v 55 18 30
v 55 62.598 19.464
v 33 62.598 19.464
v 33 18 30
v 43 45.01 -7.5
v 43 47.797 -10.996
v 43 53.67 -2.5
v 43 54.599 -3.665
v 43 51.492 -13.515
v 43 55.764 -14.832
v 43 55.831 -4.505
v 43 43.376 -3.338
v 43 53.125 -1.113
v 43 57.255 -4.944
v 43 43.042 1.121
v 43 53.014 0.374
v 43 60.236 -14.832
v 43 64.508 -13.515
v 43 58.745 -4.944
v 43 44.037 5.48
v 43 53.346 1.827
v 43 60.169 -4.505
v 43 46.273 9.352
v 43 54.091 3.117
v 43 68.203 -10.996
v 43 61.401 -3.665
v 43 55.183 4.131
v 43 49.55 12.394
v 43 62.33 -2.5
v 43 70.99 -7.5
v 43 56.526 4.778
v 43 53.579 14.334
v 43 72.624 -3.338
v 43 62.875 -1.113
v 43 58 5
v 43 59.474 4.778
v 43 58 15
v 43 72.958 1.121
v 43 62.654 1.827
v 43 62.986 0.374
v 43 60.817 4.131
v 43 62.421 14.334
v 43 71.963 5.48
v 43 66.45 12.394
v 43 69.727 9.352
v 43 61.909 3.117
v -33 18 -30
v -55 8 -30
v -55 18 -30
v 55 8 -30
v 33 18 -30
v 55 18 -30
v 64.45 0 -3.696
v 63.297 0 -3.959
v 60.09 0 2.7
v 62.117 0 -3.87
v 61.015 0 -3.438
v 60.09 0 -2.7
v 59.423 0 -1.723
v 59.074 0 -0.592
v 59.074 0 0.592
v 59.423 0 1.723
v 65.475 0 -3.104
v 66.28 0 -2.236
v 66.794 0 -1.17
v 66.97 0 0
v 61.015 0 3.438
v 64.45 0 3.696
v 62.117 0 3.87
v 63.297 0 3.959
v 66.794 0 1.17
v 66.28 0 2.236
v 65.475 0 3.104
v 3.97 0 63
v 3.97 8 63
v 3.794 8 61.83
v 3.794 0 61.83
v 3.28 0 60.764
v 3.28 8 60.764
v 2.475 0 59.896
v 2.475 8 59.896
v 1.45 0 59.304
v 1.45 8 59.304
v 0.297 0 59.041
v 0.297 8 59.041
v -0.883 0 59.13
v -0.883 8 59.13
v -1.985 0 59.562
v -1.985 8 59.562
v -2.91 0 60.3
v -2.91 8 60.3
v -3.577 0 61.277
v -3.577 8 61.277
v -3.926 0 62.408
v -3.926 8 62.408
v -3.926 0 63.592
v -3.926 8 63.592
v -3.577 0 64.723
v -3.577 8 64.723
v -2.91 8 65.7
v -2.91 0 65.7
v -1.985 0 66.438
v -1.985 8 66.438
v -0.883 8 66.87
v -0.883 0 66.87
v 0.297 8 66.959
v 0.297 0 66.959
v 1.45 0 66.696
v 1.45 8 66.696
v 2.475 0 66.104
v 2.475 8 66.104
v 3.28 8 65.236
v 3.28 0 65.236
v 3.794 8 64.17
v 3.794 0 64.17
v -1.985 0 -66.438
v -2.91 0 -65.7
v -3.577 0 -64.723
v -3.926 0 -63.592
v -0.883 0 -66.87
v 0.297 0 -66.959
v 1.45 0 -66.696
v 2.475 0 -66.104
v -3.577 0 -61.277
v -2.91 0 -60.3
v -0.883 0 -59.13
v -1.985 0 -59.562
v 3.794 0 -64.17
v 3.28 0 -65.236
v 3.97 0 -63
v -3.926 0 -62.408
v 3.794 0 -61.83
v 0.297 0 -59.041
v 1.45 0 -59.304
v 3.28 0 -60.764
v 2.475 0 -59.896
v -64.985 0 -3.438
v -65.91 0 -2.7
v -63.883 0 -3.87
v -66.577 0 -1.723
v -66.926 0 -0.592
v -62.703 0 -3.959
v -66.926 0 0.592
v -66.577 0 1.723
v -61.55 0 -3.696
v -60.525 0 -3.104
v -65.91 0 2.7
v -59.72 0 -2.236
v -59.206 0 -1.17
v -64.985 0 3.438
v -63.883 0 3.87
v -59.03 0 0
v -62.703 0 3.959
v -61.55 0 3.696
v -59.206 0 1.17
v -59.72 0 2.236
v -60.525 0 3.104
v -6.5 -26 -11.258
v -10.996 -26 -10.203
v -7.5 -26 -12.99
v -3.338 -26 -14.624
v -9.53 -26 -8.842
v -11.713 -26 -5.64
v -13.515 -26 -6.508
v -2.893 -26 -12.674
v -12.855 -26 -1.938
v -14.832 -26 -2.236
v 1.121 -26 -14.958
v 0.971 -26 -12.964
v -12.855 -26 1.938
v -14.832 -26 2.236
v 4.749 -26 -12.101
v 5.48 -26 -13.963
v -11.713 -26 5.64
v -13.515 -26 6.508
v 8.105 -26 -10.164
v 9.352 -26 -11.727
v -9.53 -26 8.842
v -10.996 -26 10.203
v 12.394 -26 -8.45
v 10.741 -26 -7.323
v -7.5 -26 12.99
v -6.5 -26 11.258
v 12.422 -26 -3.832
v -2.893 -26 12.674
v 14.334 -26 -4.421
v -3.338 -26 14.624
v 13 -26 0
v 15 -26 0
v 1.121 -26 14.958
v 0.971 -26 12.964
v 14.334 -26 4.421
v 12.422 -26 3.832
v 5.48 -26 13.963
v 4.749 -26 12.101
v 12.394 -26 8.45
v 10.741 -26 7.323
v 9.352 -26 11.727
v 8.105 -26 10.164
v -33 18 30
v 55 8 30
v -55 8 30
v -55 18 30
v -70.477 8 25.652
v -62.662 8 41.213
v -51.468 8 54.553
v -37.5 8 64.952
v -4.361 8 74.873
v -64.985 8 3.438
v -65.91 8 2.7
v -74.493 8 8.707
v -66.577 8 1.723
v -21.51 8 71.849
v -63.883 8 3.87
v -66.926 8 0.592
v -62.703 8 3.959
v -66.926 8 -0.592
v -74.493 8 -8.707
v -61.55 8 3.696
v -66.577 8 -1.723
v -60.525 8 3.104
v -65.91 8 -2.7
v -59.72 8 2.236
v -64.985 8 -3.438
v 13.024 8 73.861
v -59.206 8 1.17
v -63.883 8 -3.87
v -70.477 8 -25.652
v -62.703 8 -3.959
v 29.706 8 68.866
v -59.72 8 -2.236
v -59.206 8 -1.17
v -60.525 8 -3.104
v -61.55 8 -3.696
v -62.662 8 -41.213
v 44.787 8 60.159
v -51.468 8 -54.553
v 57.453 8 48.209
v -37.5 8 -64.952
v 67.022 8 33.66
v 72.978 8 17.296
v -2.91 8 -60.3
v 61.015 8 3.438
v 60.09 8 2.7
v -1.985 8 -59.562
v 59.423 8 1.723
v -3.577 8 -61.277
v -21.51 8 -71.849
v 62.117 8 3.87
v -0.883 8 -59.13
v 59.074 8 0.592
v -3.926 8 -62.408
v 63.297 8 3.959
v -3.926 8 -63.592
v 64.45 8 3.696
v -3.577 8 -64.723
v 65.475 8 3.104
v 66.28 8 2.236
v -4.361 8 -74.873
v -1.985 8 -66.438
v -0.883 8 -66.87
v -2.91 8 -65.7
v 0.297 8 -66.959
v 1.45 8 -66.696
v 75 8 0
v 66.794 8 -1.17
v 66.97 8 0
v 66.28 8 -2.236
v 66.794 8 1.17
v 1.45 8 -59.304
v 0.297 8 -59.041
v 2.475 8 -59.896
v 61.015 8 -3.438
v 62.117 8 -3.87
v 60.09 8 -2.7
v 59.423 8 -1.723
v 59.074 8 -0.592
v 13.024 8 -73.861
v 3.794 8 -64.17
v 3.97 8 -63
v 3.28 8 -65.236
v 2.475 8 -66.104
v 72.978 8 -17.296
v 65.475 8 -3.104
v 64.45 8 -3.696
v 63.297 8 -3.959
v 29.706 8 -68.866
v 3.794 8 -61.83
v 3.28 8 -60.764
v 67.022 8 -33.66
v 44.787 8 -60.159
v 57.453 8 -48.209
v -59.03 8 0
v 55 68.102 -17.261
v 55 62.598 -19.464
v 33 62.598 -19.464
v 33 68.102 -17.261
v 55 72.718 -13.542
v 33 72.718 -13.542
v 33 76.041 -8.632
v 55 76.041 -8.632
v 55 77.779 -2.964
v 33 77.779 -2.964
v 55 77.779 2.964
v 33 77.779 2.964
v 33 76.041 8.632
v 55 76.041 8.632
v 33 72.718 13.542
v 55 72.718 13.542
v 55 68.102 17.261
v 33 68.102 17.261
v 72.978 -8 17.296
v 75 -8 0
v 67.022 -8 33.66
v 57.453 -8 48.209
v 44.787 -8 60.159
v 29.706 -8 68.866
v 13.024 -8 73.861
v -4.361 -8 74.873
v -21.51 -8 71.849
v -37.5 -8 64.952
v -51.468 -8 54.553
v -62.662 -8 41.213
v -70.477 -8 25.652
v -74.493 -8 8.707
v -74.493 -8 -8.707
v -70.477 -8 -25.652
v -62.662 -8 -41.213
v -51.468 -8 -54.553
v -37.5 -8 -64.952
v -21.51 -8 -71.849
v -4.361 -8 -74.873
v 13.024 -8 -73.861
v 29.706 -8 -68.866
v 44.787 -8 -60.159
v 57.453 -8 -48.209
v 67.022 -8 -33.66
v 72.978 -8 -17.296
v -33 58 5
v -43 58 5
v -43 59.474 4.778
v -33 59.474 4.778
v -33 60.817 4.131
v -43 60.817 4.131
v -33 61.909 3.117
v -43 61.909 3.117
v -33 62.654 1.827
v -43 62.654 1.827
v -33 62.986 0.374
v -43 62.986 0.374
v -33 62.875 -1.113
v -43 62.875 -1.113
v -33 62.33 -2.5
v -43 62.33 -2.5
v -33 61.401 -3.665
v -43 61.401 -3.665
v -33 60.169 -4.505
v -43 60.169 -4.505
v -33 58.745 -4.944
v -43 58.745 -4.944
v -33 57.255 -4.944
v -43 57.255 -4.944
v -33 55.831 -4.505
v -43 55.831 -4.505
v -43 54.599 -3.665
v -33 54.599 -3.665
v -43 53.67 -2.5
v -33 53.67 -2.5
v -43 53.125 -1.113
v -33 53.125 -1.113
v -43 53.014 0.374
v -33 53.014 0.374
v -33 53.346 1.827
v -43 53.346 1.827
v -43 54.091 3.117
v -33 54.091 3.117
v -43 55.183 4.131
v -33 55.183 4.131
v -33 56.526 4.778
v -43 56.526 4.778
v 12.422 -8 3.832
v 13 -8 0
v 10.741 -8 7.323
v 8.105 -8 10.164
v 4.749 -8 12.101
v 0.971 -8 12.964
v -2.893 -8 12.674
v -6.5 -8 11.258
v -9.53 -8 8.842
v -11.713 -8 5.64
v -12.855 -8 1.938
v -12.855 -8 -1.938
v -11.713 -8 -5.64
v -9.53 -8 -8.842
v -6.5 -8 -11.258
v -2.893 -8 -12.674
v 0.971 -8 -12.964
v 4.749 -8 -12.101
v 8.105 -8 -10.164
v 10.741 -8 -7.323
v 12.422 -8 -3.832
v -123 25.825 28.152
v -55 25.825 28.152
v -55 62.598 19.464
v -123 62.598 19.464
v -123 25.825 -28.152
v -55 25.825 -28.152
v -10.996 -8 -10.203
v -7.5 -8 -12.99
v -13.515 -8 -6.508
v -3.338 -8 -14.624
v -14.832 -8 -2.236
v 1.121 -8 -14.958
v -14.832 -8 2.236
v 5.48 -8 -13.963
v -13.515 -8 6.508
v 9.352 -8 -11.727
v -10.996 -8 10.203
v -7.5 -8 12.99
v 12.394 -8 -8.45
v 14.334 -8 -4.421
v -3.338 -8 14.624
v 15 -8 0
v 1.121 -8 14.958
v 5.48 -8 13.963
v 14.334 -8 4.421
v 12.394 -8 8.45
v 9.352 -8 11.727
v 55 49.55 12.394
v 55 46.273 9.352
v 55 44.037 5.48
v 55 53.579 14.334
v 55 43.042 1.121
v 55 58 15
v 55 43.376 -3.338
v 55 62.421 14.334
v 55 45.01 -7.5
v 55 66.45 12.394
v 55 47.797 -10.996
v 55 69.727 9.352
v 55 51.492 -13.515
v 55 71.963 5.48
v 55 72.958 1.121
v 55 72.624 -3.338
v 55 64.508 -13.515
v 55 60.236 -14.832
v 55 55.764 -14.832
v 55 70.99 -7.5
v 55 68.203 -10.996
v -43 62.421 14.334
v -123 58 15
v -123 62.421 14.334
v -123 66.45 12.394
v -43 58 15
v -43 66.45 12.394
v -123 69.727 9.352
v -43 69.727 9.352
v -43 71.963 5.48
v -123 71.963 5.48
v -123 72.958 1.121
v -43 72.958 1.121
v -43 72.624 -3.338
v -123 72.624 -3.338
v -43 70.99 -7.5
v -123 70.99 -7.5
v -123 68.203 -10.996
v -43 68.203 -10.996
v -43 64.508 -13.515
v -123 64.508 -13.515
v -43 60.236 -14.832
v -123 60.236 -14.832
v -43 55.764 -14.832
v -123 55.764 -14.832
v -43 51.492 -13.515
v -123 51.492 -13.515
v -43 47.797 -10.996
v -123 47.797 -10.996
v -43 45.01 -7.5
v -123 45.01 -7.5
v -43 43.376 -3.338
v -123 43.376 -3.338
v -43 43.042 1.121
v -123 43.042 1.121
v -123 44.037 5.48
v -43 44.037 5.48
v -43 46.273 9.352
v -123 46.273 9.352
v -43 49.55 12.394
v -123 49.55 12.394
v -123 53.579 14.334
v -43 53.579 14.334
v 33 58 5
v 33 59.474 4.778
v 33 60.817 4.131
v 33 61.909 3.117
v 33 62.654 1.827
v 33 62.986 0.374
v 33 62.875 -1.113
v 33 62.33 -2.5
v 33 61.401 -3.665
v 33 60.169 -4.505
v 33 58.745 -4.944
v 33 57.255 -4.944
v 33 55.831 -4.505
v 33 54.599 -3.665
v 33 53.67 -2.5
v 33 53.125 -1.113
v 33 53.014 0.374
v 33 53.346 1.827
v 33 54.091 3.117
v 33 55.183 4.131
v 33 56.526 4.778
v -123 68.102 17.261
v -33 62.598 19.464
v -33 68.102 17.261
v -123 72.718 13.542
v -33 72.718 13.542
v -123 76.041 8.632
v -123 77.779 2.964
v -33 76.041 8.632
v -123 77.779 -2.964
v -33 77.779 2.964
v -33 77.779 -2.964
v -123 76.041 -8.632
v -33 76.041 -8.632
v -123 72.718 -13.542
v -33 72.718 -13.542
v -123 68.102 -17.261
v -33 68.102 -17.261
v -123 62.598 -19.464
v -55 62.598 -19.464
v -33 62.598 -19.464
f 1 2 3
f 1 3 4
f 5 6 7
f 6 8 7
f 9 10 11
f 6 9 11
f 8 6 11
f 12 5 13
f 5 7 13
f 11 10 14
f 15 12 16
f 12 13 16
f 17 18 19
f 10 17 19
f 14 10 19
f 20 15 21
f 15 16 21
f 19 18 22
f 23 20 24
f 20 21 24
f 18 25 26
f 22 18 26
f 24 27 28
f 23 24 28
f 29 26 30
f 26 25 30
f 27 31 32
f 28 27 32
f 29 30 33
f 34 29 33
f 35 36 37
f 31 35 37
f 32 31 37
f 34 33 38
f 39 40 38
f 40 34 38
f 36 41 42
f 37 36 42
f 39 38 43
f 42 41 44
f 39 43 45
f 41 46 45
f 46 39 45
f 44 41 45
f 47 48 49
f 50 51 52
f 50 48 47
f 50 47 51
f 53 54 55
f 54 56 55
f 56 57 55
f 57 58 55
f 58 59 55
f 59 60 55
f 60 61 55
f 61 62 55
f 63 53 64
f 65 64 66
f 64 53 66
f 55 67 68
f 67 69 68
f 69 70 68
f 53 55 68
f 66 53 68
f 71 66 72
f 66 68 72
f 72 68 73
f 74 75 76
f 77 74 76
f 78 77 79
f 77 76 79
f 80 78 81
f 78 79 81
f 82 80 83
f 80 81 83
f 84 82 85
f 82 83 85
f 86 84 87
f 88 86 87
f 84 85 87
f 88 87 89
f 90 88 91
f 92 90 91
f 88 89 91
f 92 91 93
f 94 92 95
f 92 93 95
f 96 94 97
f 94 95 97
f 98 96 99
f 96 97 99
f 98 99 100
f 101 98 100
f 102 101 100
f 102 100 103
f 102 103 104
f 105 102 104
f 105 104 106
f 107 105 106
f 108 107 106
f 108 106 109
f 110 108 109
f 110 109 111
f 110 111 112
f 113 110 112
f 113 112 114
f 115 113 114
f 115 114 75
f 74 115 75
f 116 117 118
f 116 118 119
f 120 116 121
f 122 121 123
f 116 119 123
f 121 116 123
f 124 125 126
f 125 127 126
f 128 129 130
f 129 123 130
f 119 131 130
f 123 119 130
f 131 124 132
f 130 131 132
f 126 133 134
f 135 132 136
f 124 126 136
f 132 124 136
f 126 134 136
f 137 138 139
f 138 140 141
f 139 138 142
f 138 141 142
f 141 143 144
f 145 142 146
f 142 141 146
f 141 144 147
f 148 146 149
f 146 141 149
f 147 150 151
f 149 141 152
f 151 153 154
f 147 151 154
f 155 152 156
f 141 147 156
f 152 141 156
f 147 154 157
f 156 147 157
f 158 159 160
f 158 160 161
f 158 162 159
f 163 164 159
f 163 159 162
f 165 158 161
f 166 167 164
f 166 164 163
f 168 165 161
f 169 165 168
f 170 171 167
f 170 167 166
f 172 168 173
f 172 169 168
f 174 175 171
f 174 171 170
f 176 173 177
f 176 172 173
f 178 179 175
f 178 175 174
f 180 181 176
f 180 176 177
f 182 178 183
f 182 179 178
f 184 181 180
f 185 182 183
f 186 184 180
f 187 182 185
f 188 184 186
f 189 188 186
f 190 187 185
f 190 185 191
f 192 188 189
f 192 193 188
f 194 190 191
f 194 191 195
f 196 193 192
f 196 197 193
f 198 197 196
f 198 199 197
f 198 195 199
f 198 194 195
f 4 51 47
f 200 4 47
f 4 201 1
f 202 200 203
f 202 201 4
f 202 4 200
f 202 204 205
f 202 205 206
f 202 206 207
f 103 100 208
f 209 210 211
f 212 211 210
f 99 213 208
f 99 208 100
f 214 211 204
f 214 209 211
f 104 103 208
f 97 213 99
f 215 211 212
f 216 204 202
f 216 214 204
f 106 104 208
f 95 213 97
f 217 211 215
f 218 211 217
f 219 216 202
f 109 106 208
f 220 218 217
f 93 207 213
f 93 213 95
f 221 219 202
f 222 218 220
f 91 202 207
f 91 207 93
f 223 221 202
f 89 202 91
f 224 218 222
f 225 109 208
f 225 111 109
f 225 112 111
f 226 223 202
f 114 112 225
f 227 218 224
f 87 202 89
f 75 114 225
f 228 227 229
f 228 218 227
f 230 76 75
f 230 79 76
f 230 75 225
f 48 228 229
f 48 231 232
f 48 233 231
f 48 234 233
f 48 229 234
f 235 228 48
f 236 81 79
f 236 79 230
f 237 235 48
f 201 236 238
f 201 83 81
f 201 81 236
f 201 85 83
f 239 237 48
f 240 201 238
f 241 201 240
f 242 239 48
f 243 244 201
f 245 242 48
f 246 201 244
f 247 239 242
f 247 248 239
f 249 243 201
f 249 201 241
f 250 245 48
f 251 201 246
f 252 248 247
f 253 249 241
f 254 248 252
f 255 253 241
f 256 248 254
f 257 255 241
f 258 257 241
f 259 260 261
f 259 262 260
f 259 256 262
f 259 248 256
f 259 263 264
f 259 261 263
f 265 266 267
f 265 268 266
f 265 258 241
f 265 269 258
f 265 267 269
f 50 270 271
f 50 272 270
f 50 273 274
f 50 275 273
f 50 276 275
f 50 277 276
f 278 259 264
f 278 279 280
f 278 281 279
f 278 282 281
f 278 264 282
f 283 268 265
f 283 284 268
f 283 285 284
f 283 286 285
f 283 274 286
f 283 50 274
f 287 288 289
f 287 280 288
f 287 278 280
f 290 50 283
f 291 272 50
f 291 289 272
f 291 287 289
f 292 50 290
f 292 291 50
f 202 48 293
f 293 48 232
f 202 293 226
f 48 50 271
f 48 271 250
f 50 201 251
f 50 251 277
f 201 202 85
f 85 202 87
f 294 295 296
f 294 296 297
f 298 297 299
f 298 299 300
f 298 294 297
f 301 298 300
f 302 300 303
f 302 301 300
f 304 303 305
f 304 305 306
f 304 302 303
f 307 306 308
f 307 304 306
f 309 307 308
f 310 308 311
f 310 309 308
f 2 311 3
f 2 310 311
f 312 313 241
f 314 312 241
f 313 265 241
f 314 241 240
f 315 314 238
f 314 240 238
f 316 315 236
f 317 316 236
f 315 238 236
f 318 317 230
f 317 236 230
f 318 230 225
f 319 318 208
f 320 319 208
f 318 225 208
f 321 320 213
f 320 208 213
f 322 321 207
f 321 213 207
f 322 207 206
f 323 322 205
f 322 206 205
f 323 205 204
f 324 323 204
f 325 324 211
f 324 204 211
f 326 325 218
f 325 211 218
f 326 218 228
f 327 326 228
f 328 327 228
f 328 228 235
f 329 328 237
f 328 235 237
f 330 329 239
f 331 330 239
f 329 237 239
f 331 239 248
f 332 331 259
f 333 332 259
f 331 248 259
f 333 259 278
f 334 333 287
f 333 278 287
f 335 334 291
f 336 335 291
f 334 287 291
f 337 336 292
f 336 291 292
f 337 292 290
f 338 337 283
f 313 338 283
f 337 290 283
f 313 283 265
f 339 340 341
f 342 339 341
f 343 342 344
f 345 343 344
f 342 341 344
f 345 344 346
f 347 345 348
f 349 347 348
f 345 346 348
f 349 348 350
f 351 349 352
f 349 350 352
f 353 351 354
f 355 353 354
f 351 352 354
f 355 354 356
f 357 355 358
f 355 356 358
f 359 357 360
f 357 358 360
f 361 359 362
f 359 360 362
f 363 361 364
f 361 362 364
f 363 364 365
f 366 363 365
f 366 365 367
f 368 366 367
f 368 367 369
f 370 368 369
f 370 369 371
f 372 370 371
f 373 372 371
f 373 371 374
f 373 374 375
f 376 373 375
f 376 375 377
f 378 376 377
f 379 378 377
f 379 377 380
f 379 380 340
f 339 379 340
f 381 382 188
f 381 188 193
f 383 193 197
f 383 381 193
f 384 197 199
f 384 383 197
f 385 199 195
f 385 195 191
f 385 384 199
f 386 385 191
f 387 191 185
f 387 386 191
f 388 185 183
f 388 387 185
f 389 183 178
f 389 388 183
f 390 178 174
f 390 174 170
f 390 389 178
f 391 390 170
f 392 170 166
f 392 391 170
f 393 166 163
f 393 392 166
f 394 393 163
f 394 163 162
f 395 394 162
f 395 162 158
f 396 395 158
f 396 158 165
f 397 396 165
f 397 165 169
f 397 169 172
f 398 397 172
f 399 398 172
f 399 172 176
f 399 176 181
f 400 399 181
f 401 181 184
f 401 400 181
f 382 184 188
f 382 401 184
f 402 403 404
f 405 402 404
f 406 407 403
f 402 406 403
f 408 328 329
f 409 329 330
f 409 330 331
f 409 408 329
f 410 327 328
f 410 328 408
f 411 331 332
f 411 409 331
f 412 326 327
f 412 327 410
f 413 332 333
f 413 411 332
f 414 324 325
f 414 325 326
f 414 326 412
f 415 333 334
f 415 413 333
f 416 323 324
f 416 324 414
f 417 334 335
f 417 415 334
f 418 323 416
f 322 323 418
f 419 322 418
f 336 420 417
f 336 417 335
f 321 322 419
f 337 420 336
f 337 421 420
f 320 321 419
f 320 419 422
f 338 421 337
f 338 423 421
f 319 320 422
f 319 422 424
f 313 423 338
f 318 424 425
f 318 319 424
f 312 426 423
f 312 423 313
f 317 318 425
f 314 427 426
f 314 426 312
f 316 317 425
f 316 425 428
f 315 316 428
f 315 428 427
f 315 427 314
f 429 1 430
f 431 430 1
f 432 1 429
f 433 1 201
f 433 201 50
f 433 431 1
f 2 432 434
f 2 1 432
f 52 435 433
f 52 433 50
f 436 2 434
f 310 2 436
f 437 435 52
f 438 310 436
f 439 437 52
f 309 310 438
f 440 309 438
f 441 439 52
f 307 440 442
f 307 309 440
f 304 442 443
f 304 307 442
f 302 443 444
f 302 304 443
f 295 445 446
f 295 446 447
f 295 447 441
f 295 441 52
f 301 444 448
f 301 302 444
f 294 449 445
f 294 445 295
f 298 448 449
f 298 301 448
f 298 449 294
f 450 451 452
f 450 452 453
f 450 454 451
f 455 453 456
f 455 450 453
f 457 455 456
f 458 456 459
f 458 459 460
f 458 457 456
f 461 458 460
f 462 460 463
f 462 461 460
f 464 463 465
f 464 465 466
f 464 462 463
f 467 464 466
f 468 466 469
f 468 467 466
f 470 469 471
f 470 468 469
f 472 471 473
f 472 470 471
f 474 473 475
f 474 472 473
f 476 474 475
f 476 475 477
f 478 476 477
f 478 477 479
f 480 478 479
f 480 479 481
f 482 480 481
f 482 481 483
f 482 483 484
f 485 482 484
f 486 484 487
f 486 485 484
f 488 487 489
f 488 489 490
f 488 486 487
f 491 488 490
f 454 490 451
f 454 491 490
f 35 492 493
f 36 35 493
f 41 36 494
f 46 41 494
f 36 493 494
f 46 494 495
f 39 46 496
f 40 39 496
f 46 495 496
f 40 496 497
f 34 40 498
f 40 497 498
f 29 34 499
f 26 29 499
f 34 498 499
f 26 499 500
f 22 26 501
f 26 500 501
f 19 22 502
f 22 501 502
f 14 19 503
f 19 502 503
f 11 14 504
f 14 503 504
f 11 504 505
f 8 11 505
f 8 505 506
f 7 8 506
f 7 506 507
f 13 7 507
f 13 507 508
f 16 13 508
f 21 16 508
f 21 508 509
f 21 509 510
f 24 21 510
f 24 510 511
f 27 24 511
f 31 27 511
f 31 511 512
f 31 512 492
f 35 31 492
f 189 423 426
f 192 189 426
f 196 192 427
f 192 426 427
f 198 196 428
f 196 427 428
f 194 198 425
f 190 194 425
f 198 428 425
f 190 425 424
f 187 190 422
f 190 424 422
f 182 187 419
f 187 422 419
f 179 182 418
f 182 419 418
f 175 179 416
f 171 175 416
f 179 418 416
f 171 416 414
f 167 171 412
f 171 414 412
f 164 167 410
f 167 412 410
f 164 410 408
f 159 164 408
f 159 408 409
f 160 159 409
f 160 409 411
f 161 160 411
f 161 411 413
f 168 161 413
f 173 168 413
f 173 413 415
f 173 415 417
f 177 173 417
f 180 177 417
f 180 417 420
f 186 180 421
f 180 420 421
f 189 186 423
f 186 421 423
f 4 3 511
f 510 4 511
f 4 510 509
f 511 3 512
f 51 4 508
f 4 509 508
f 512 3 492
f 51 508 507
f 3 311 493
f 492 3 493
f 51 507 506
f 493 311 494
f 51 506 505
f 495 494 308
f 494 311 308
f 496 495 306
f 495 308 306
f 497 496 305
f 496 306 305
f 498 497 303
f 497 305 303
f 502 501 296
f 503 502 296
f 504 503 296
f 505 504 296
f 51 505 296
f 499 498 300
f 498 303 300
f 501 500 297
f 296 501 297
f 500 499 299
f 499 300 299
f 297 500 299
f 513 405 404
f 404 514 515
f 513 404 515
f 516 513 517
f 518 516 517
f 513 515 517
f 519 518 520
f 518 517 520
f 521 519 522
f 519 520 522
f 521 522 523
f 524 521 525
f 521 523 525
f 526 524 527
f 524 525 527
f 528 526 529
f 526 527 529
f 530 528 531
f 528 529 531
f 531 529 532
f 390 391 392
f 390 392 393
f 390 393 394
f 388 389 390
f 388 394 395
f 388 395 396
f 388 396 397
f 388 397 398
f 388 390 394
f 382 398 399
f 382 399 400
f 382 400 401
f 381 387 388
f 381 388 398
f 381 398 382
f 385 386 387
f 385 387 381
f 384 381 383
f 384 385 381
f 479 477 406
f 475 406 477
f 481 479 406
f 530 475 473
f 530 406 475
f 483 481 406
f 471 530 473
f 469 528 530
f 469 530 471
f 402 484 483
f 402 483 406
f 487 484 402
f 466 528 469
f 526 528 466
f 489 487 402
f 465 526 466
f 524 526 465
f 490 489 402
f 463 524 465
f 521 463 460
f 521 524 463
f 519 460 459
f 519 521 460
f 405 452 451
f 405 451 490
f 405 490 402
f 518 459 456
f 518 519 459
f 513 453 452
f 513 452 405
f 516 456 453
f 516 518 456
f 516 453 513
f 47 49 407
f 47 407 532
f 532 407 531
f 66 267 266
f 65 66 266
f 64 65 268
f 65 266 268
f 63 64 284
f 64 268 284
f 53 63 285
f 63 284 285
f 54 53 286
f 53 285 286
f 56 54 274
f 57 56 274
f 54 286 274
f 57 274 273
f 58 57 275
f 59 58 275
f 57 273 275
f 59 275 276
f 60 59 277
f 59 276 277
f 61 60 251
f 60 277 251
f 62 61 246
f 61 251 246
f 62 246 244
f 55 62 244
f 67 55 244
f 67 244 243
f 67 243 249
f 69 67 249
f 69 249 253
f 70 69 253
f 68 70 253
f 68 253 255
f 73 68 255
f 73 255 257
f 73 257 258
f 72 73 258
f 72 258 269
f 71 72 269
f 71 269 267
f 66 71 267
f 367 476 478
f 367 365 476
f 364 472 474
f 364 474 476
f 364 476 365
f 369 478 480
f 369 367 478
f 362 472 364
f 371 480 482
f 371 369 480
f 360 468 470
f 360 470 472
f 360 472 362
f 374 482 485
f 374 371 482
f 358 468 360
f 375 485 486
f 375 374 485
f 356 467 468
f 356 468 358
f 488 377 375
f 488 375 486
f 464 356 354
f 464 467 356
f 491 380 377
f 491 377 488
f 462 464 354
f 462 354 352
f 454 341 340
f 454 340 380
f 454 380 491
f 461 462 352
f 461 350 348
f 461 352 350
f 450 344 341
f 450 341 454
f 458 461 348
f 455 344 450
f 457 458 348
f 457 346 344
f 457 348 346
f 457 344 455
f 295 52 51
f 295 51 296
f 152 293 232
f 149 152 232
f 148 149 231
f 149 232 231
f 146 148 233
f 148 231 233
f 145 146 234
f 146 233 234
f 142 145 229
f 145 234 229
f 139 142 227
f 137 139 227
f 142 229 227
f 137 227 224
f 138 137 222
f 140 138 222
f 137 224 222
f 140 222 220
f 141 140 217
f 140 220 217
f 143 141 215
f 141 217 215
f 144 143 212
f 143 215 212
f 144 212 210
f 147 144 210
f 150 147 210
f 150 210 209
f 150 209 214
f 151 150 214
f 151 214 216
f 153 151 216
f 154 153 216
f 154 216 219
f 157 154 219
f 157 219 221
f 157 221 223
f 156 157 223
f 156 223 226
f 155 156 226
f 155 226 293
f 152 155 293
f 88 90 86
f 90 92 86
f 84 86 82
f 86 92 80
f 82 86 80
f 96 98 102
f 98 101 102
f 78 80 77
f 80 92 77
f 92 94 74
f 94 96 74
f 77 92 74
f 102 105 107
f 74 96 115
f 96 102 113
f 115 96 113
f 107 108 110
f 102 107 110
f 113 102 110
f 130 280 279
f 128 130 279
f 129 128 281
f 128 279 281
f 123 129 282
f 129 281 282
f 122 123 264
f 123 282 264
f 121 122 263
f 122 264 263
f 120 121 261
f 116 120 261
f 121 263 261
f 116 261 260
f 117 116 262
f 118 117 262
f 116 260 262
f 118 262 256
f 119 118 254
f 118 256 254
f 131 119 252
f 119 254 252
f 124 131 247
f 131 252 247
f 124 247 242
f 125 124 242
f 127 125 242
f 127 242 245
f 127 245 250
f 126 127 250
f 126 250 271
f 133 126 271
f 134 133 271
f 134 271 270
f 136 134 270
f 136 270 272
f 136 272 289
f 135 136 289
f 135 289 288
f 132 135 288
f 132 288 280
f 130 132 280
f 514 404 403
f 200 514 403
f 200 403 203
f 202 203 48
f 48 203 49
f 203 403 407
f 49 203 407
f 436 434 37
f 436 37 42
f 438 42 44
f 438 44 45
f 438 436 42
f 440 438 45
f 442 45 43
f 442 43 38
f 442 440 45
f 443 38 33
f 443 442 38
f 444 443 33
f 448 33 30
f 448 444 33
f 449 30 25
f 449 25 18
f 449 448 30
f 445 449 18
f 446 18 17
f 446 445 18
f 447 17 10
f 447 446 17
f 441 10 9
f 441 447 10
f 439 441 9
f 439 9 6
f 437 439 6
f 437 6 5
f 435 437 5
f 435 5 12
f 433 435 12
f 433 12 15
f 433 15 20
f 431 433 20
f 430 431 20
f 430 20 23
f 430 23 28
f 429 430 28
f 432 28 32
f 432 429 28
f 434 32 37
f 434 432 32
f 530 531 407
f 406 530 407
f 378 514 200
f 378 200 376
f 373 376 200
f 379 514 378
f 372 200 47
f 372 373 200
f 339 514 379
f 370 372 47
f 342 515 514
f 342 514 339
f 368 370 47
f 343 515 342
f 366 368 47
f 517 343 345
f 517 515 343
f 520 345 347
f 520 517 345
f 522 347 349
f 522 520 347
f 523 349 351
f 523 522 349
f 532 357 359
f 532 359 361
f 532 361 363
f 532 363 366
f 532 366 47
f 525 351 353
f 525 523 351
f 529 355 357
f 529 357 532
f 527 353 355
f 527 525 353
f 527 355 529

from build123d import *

# Parameters (mm, degrees)
CROQUIS1_R              = 75
SALIENTE_EXTRUIR1_DEPTH = 8
CROQUIS2_R              = 3.97
CORTAR_EXTRUIR1_DEPTH   = 20
SALIENTE_EXTRUIR2_DEPTH = 10
SALIENTE_EXTRUIR3_DEPTH = 22
CROQUIS5_R              = 15
CORTAR_EXTRUIR2_DEPTH   = 12
CROQUIS6_R              = 5
CORTAR_EXTRUIR3_DEPTH   = 126
CROQUIS7_R              = 15
SALIENTE_EXTRUIR4_DEPTH = 68
CROQUIS8_R              = 75
SALIENTE_EXTRUIR5_DEPTH = 8
CROQUIS9_R              = 15
CROQUIS9_R_2            = 13
SALIENTE_EXTRUIR6_DEPTH = 18


with BuildPart() as part:
    # Croquis1 → Saliente-Extruir1 (new body)
    with BuildSketch(Plane(origin=(0, 0, 0), x_dir=(1, 0, 0), z_dir=(0, 1, 0))):
        Circle(CROQUIS1_R)
    extrude(amount=SALIENTE_EXTRUIR1_DEPTH)

    # Croquis2 → Cortar-Extruir1 (cut)
    with BuildSketch(Plane(origin=(0, 8, 0), x_dir=(1, 0, 0), z_dir=(0, 1, 0))):
        with Locations((0, 63)):
            Circle(CROQUIS2_R)
        with Locations((63, 0)):
            Circle(CROQUIS2_R)
        with Locations((0, -63)):
            Circle(CROQUIS2_R)
        with Locations((-63, 0)):
            Circle(CROQUIS2_R)
    extrude(amount=-CORTAR_EXTRUIR1_DEPTH, mode=Mode.SUBTRACT)

    # Croquis3 → Saliente-Extruir2 (add)
    with BuildSketch(Plane(origin=(0, 8, 0), x_dir=(1, 0, 0), z_dir=(0, 1, 0))):
        Polygon((-55, 0), (-55, 30), (55, 30), (55, 0), (55, -30), (-55, -30), align=None)
    extrude(amount=SALIENTE_EXTRUIR2_DEPTH)

    # Croquis4 → Saliente-Extruir3 (add)
    with BuildSketch(Plane(origin=(55, 0, 0), x_dir=(0, 0, -1), z_dir=(1, 0, 0))):
        with BuildLine():
            Line((-30, 18), (30, 18))
            Line((30, 18), (19.464281728, 62.598174498))
            ThreePointArc((19.464281728, 62.598174498), (0, 78.000036798), (-19.464281728, 62.598174498))
            Line((-19.464281728, 62.598174498), (-30, 18))
        make_face()
    saliente_extruir3 = extrude(amount=-SALIENTE_EXTRUIR3_DEPTH)

    # Simetría1: Saliente-Extruir3 across plane
    add(saliente_extruir3.mirror(Plane(origin=(0, 0, 0), x_dir=(0, 0, 1), z_dir=(1, 0, 0))))

    # Croquis5 → Cortar-Extruir2 (cut)
    with BuildSketch(Plane.ZY.offset(55)):
        with Locations((0, 58)):
            Circle(CROQUIS5_R)
    cortar_extruir2 = extrude(amount=-CORTAR_EXTRUIR2_DEPTH, mode=Mode.SUBTRACT)

    # Simetría2: Cortar-Extruir2 across plane
    add(cortar_extruir2.mirror(Plane(origin=(0, 0, 0), x_dir=(0, 0, 1), z_dir=(1, 0, 0))), mode=Mode.SUBTRACT)

    # Croquis6 → Cortar-Extruir3 (cut)
    with BuildSketch(Plane.ZY.offset(43)):
        with Locations((0, 58)):
            Circle(CROQUIS6_R)
    extrude(amount=-CORTAR_EXTRUIR3_DEPTH, mode=Mode.SUBTRACT)

    # Croquis7 → Saliente-Extruir4 (add)
    with BuildSketch(Plane.ZY.offset(55)):
        with BuildLine():
            Line((-19.464281728, 62.598174498), (-28.151527476, 25.824668242))
            Line((-28.151527476, 25.824668242), (28.151527476, 25.824668242))
            Line((28.151527476, 25.824668242), (19.464281728, 62.598174498))
            ThreePointArc((19.464281728, 62.598174498), (0, 78.000036798), (-19.464281728, 62.598174498))
        make_face()
        with Locations((0, 58)):
            Circle(CROQUIS7_R, mode=Mode.SUBTRACT)
    extrude(amount=SALIENTE_EXTRUIR4_DEPTH)

    # Croquis8 → Saliente-Extruir5 (add)
    with BuildSketch(Plane.XZ):
        Circle(CROQUIS8_R)
    extrude(amount=SALIENTE_EXTRUIR5_DEPTH)

    # Croquis9 → Saliente-Extruir6 (add)
    with BuildSketch(Plane.XZ.offset(8)):
        Circle(CROQUIS9_R)
        Circle(CROQUIS9_R_2, mode=Mode.SUBTRACT)
    extrude(amount=SALIENTE_EXTRUIR6_DEPTH)


solid = part.part
